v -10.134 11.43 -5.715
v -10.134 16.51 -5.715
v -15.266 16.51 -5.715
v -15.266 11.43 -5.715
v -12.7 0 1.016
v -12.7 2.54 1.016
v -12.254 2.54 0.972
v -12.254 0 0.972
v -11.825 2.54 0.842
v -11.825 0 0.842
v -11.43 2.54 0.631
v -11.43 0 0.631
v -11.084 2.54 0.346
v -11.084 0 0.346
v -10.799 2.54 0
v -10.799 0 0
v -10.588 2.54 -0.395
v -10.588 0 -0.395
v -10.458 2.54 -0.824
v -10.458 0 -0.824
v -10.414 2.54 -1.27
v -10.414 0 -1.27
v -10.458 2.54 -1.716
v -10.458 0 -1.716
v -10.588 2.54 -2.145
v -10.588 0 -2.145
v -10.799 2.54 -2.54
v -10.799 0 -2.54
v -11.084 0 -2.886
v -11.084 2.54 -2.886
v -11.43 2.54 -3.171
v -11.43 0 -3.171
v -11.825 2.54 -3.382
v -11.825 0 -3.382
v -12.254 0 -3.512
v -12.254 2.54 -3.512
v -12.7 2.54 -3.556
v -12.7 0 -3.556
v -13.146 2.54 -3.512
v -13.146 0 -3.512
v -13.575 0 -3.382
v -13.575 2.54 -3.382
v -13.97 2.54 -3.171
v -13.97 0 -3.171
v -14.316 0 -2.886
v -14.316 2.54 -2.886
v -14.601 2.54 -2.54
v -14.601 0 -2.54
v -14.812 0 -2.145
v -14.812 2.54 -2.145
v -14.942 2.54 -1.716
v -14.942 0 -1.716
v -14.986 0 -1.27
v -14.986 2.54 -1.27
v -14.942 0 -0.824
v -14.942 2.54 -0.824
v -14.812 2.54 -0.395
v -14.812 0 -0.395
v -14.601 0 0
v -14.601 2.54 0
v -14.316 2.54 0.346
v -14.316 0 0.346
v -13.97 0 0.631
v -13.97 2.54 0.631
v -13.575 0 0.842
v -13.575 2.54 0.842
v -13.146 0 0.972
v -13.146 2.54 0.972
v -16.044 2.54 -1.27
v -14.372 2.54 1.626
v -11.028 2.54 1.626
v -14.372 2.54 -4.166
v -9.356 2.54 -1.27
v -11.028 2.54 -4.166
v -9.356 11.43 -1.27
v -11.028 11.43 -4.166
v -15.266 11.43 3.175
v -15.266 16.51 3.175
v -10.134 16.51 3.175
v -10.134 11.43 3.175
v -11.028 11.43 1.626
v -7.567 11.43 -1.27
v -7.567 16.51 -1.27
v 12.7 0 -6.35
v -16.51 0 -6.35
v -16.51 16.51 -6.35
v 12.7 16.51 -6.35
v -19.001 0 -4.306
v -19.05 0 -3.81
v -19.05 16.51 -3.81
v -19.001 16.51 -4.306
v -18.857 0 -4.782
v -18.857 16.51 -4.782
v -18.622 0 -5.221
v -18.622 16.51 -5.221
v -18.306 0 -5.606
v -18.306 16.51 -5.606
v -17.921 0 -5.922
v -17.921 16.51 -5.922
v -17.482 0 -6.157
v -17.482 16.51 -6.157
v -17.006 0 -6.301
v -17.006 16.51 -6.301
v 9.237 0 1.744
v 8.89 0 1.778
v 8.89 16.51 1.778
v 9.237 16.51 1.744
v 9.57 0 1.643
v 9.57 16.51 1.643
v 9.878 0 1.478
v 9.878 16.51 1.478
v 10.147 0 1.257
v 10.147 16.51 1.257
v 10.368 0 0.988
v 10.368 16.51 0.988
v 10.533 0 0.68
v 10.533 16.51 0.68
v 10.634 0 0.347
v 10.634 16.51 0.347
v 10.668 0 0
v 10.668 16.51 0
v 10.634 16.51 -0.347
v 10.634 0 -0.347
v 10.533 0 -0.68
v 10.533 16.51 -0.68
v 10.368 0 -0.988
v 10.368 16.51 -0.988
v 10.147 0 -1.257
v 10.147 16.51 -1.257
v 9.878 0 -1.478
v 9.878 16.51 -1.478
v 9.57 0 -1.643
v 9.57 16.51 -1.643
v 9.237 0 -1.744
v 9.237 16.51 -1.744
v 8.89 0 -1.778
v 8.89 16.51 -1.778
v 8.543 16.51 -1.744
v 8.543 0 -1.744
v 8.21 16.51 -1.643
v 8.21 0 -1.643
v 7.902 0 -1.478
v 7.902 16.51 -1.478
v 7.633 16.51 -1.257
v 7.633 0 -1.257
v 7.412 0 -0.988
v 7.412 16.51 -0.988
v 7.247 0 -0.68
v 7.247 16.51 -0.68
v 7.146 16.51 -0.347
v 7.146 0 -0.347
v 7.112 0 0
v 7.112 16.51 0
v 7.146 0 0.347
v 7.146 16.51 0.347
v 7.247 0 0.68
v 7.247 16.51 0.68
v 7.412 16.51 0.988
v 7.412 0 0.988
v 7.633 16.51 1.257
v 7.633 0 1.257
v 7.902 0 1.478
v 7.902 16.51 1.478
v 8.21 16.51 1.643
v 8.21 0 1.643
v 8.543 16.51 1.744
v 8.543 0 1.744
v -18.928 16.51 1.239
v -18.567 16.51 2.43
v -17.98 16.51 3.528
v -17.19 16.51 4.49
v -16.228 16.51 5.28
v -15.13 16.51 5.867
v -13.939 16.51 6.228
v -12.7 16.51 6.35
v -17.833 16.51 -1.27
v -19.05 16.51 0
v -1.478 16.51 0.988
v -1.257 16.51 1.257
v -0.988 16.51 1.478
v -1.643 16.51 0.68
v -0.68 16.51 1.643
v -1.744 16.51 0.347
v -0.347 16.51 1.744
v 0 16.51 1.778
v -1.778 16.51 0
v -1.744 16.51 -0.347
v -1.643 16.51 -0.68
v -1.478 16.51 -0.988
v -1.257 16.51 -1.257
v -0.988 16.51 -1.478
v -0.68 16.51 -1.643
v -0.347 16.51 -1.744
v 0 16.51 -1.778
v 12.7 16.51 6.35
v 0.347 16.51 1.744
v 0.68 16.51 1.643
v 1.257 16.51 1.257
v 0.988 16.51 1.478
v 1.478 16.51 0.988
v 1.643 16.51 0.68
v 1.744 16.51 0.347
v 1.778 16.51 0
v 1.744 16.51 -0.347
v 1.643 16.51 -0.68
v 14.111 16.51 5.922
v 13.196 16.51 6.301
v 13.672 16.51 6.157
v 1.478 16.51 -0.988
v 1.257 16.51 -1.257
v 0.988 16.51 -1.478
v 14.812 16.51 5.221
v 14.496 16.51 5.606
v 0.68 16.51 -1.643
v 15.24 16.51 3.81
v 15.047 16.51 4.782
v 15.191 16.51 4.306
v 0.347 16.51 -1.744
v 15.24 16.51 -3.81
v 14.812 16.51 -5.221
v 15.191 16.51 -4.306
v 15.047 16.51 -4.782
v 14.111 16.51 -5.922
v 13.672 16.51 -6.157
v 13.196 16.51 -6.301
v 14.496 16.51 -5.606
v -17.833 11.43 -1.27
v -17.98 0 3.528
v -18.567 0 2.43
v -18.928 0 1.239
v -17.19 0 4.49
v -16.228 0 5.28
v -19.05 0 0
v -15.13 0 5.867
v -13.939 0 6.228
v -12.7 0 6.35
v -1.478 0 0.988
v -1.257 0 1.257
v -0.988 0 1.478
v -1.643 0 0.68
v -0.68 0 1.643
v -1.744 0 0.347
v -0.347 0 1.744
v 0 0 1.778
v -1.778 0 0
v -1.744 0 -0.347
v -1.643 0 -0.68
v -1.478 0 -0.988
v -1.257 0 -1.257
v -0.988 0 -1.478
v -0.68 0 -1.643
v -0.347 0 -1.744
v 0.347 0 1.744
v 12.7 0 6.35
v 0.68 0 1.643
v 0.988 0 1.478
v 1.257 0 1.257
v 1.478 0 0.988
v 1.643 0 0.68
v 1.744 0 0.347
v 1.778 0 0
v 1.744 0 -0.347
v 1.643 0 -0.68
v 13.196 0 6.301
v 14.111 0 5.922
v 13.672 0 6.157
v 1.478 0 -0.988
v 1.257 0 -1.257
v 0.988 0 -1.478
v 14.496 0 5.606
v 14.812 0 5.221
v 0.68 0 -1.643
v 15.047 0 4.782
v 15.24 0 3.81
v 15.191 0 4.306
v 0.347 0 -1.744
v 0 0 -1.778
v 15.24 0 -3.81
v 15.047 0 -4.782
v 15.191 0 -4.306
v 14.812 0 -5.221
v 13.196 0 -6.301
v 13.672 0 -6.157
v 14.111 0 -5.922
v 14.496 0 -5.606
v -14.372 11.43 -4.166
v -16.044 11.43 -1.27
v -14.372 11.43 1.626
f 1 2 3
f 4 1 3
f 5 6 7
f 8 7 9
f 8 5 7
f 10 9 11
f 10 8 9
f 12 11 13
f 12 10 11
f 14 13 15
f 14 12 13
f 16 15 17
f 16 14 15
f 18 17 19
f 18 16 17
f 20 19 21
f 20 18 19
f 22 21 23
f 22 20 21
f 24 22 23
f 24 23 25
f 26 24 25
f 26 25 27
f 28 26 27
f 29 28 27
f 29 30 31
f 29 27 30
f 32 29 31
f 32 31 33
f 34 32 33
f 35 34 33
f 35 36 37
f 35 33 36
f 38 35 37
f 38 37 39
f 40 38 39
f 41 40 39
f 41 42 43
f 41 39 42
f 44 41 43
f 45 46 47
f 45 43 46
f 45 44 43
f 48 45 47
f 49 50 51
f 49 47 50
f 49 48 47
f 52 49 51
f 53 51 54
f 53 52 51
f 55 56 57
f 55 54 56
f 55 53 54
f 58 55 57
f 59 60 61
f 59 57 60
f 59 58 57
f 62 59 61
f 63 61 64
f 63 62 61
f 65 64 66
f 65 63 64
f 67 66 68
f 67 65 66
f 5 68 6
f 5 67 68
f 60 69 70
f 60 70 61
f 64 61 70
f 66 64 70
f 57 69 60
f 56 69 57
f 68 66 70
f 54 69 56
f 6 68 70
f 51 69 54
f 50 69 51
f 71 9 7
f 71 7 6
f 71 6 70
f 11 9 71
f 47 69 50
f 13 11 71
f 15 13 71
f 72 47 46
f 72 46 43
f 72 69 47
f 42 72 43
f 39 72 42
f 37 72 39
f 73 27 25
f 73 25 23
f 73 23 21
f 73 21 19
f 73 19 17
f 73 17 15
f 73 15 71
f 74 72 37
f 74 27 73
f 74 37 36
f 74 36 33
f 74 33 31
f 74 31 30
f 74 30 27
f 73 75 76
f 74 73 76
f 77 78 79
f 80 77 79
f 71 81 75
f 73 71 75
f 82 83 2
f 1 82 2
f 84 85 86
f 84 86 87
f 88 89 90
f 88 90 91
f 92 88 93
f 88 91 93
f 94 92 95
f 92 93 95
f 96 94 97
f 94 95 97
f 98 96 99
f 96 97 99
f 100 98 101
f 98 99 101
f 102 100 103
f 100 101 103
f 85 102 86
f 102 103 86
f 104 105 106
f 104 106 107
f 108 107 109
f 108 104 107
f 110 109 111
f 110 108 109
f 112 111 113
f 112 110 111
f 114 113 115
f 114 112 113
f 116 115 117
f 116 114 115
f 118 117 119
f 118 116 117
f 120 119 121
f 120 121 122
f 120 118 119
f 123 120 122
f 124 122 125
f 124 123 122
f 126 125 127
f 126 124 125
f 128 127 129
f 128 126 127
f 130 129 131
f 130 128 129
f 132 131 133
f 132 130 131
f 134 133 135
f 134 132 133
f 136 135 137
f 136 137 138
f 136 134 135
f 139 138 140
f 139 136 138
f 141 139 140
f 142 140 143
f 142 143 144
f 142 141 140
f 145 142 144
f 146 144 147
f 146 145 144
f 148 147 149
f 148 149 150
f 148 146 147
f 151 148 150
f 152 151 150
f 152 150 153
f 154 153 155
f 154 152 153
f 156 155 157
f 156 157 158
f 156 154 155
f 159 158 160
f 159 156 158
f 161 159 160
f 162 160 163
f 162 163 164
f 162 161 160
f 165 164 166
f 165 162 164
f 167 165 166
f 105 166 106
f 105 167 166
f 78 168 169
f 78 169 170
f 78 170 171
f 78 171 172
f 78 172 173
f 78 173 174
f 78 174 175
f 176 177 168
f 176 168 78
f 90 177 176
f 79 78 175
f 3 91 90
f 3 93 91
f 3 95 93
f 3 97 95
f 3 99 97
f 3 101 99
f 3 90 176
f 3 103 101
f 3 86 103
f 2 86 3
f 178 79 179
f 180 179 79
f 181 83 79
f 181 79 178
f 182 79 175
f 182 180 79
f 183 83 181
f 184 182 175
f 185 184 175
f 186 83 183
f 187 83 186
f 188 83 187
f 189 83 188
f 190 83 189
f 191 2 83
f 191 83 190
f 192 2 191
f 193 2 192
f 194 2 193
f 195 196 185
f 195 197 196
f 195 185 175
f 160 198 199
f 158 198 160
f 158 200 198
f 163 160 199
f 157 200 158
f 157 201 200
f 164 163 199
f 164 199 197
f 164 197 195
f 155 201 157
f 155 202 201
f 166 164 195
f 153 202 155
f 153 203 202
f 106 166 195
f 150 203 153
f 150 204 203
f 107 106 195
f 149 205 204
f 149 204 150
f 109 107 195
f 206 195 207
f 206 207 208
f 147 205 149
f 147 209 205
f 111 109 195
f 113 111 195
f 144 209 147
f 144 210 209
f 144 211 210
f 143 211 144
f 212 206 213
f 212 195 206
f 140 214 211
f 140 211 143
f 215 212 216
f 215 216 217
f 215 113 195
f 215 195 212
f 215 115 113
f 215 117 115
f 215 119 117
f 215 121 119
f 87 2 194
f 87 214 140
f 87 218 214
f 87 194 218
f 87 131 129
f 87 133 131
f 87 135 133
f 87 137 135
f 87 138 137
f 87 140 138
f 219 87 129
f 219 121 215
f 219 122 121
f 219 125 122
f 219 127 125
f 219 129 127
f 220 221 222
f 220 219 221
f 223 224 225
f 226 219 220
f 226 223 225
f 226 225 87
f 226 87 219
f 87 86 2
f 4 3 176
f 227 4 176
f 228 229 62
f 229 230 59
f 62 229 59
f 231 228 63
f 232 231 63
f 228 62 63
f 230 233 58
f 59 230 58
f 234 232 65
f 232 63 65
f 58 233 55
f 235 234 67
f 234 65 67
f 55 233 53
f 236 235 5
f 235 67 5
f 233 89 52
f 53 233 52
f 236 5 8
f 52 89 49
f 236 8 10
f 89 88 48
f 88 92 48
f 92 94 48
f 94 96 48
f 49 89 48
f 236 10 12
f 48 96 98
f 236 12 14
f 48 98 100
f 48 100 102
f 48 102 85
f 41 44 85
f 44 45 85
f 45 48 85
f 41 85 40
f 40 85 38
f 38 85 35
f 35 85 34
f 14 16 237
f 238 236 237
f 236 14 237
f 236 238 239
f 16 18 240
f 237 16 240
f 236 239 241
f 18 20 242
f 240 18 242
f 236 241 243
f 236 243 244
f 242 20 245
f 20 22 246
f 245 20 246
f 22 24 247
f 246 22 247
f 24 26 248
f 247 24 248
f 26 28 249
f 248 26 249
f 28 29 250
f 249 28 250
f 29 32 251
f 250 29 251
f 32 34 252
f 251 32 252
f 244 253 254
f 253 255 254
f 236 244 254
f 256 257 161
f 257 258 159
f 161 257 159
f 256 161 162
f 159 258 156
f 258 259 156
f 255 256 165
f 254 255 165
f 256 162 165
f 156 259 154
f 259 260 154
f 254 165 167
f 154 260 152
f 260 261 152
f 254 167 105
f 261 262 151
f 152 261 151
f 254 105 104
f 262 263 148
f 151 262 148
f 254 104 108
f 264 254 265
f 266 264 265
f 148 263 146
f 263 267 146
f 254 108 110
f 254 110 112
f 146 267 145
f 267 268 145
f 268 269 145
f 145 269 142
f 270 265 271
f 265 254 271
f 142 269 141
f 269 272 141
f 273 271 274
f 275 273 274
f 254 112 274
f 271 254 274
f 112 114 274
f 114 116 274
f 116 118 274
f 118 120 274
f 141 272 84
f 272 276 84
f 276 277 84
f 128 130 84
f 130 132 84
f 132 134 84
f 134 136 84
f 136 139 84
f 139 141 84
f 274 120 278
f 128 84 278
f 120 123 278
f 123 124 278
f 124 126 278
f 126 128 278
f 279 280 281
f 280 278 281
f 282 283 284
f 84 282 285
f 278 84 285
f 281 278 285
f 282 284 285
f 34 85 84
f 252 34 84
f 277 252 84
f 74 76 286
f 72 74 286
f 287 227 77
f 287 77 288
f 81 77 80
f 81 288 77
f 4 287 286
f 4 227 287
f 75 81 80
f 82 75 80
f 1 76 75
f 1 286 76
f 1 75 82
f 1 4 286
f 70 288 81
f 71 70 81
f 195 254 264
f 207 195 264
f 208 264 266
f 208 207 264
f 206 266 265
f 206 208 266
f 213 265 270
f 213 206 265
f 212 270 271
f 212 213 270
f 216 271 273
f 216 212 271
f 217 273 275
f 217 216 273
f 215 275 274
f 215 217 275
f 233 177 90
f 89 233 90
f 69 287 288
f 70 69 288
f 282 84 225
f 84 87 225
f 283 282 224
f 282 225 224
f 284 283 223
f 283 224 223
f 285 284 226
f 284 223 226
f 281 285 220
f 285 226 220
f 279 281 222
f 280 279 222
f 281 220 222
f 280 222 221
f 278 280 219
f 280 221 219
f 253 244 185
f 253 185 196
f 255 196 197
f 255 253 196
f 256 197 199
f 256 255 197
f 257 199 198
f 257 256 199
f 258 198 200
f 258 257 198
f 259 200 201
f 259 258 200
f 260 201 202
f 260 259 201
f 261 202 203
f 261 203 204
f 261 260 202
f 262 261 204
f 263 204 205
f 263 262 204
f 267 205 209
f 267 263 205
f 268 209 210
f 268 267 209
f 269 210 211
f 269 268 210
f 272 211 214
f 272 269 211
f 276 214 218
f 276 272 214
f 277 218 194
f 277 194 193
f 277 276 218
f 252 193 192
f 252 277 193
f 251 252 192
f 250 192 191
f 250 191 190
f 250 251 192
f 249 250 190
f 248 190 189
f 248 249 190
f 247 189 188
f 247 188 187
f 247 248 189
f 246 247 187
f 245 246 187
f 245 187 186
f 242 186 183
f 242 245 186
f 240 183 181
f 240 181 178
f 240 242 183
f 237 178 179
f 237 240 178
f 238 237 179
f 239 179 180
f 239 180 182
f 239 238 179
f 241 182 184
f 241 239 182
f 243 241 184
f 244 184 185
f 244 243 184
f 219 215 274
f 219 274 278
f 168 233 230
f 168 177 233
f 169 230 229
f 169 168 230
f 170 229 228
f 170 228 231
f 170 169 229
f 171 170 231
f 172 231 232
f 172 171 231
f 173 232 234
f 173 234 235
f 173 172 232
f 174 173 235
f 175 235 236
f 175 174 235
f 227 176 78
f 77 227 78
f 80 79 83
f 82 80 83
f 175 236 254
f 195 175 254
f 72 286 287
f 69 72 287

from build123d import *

# Parameters (mm, degrees)
SKETCH1_W           = 34.29
SKETCH1_H           = 12.7
SKETCH1_R           = 2.286
SKETCH1_R_2         = 1.778
BOSS_EXTRUDE1_DEPTH = 16.51
FILLET1_R           = 2.54
FILLET2_R           = 6.35
CUT_EXTRUDE2_DEPTH  = 5.08
CUT_EXTRUDE3_DEPTH  = 8.89


with BuildPart() as part:
    # Sketch1 → Boss-Extrude1 (new body)
    with BuildSketch(Plane(origin=(0, 0, 0), x_dir=(1, 0, 0), z_dir=(0, 1, 0))):
        with Locations((-1.905, 0)):
            Rectangle(SKETCH1_W, SKETCH1_H)
        with Locations(Location((-12.7, 1.27, 0), (0, 0, 270))):
            Circle(SKETCH1_R, mode=Mode.SUBTRACT)
        with Locations(Location((0, 0, 0), (0, 0, 270))):
            Circle(SKETCH1_R_2, mode=Mode.SUBTRACT)
        with Locations(Location((8.89, 0, 0), (0, 0, 270))):
            Circle(SKETCH1_R_2, mode=Mode.SUBTRACT)
    extrude(amount=BOSS_EXTRUDE1_DEPTH)

    # Fillet1
    fillet1_edges = [part.edges().sort_by_distance(p)[0] for p in [
        (-19.05, 8.255, -6.35),
        (15.24, 8.255, -6.35),
        (15.24, 8.255, 6.35),
    ]]
    fillet(fillet1_edges, radius=FILLET1_R)

    # Fillet2
    fillet2_edges = [part.edges().sort_by_distance(p)[0] for p in [
        (-19.05, 8.255, 6.35),
    ]]
    fillet(fillet2_edges, radius=FILLET2_R)

    # Sketch4 → Cut-Extrude2 (cut)
    with BuildSketch(Plane(origin=(0, 16.51, 0), x_dir=(1, 0, 0), z_dir=(0, 1, 0))):
        Polygon((-7.567356107, 1.27), (-10.133678053, 5.715), (-15.266321947, 5.715), (-17.832643893, 1.27), (-15.266321947, -3.175), (-10.133678053, -3.175), align=None)
    extrude(amount=-CUT_EXTRUDE2_DEPTH, mode=Mode.SUBTRACT)

    # Sketch5 → Cut-Extrude3 (cut)
    with BuildSketch(Plane(origin=(0, 11.43, 0), x_dir=(1, 0, 0), z_dir=(0, 1, 0))):
        Polygon((-9.356438934, 1.27), (-11.028219467, 4.165608823), (-14.371780533, 4.165608823), (-16.043561066, 1.27), (-14.371780533, -1.625608823), (-11.028219467, -1.625608823), align=None)
    extrude(amount=-CUT_EXTRUDE3_DEPTH, mode=Mode.SUBTRACT)


solid = part.part
